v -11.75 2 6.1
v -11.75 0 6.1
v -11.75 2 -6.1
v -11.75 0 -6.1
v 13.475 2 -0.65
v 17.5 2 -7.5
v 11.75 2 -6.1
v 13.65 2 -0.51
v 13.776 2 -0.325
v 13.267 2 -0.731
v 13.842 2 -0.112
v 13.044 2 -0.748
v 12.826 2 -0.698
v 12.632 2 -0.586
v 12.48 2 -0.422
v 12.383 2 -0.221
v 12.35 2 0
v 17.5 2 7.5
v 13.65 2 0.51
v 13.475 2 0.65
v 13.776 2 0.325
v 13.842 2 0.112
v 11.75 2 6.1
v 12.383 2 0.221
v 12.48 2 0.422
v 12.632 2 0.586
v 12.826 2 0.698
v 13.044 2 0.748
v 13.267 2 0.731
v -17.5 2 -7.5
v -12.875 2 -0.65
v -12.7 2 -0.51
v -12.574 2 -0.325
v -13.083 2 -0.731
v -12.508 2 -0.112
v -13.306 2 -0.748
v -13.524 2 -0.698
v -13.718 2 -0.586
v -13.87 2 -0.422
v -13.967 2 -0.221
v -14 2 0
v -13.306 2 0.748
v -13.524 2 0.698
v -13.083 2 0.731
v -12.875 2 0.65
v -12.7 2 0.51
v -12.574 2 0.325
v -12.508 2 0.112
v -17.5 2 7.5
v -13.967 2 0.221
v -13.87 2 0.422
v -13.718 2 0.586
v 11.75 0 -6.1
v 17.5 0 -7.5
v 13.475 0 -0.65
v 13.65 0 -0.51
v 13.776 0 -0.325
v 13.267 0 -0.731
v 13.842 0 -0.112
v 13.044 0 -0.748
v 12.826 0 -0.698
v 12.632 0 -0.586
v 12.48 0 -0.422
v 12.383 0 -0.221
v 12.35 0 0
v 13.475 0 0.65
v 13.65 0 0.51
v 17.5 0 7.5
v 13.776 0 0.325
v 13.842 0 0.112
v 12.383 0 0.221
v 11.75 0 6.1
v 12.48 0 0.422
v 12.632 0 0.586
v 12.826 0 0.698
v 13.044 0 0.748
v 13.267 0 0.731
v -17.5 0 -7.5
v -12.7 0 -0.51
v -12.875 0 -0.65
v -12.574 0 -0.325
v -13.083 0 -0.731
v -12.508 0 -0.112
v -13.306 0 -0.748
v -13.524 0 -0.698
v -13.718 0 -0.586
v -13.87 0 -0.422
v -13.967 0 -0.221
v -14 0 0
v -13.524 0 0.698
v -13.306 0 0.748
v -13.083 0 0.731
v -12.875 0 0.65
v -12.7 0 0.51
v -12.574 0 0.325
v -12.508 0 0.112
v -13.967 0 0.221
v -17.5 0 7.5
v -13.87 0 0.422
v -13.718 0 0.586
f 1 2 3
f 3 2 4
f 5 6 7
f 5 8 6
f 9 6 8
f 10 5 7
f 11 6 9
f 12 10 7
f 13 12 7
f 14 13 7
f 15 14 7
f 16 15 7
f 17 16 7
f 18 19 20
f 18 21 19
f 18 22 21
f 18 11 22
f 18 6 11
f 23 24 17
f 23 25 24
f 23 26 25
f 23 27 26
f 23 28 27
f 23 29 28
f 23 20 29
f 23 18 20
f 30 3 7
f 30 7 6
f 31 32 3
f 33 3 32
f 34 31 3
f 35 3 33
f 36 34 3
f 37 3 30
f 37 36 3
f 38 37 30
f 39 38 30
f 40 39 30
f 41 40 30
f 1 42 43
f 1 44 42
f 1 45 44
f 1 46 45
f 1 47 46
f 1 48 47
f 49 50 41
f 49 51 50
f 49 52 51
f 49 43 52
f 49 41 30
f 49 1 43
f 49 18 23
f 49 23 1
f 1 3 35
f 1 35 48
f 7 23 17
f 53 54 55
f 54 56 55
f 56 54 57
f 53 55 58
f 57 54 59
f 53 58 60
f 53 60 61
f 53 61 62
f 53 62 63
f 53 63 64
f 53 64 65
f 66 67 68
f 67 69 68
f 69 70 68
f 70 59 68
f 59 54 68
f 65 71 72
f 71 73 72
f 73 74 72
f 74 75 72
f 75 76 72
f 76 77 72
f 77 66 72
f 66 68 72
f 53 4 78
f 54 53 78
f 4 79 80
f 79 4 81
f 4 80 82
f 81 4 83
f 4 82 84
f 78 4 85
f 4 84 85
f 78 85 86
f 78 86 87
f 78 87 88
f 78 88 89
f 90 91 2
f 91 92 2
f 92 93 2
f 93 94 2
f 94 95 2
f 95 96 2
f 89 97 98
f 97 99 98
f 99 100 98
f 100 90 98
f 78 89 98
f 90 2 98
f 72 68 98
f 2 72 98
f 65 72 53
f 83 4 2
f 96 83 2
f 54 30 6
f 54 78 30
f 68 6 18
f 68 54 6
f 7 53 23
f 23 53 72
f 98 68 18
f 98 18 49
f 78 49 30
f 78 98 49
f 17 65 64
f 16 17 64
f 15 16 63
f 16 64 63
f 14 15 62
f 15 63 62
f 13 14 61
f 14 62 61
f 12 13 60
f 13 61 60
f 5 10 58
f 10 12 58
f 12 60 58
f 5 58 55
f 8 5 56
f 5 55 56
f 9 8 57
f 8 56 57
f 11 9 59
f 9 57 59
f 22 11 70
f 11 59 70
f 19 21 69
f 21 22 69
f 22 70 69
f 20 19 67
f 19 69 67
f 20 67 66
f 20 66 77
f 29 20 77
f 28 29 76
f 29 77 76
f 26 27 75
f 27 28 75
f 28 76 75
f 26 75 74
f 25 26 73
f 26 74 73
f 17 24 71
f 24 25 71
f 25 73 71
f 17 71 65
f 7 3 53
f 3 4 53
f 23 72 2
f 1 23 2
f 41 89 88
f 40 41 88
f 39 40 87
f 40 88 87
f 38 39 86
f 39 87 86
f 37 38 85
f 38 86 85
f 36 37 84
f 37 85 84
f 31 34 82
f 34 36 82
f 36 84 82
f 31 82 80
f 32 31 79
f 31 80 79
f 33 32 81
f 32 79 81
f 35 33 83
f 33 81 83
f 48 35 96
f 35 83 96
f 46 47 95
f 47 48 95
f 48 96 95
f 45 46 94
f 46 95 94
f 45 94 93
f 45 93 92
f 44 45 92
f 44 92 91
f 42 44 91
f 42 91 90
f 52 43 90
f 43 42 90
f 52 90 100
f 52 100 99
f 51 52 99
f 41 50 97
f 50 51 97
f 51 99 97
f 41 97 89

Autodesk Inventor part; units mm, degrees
ref_plane "YZ Plane" through (0, 0, 0) normal (1, 0, 0) x (0, 1, 0)
ref_plane "XZ Plane" through (0, 0, 0) normal (0, 1, 0) x (-1, 0, 0)
ref_plane "XY Plane" through (0, 0, 0) normal (0, 0, 1) x (1, 0, 0)
sketch "Sketch1" plane through (0, 0, 0) normal (0, 1, 0) x (-1, 0, 0)
  line L0 (17.5, -7.5) -> (-17.5, -7.5)
  line L1 (-17.5, -7.5) -> (-17.5, 7.5)
  line L2 (-17.5, 7.5) -> (17.5, 7.5)
  line L3 (17.5, 7.5) -> (17.5, -7.5)
  line L4 (17.5, -7.5) -> (-17.5, 7.5) construction
  line L5 (-17.5, -7.5) -> (17.5, 7.5) construction
  line L6 (11.75, -6.1) -> (-11.75, -6.1)
  line L7 (-11.75, -6.1) -> (-11.75, 6.1)
  line L8 (-11.75, 6.1) -> (11.75, 6.1)
  line L9 (11.75, 6.1) -> (11.75, -6.1)
  line L10 (11.75, -6.1) -> (-11.75, 6.1) construction
  line L11 (-11.75, -6.1) -> (11.75, 6.1) construction
  circle A0 centre (13.25, 0) radius 0.75
  circle A1 centre (-13.1, 0) radius 0.75
  point P0 (0, 0)
  dimension "d37" = 35
  dimension "d38" = 15
  dimension "d39" = 5.75
  dimension "d40" = 5.75
  dimension "d41" = 12.2
  dimension "d42" = 1.5
  dimension "d43" = 1.5
  dimension "d44" = 4.25
  dimension "d45" = 5.15
extrude "Extrusion4" add sketch "Sketch1" along normal blind 2
properties part number "servo housing lid"
